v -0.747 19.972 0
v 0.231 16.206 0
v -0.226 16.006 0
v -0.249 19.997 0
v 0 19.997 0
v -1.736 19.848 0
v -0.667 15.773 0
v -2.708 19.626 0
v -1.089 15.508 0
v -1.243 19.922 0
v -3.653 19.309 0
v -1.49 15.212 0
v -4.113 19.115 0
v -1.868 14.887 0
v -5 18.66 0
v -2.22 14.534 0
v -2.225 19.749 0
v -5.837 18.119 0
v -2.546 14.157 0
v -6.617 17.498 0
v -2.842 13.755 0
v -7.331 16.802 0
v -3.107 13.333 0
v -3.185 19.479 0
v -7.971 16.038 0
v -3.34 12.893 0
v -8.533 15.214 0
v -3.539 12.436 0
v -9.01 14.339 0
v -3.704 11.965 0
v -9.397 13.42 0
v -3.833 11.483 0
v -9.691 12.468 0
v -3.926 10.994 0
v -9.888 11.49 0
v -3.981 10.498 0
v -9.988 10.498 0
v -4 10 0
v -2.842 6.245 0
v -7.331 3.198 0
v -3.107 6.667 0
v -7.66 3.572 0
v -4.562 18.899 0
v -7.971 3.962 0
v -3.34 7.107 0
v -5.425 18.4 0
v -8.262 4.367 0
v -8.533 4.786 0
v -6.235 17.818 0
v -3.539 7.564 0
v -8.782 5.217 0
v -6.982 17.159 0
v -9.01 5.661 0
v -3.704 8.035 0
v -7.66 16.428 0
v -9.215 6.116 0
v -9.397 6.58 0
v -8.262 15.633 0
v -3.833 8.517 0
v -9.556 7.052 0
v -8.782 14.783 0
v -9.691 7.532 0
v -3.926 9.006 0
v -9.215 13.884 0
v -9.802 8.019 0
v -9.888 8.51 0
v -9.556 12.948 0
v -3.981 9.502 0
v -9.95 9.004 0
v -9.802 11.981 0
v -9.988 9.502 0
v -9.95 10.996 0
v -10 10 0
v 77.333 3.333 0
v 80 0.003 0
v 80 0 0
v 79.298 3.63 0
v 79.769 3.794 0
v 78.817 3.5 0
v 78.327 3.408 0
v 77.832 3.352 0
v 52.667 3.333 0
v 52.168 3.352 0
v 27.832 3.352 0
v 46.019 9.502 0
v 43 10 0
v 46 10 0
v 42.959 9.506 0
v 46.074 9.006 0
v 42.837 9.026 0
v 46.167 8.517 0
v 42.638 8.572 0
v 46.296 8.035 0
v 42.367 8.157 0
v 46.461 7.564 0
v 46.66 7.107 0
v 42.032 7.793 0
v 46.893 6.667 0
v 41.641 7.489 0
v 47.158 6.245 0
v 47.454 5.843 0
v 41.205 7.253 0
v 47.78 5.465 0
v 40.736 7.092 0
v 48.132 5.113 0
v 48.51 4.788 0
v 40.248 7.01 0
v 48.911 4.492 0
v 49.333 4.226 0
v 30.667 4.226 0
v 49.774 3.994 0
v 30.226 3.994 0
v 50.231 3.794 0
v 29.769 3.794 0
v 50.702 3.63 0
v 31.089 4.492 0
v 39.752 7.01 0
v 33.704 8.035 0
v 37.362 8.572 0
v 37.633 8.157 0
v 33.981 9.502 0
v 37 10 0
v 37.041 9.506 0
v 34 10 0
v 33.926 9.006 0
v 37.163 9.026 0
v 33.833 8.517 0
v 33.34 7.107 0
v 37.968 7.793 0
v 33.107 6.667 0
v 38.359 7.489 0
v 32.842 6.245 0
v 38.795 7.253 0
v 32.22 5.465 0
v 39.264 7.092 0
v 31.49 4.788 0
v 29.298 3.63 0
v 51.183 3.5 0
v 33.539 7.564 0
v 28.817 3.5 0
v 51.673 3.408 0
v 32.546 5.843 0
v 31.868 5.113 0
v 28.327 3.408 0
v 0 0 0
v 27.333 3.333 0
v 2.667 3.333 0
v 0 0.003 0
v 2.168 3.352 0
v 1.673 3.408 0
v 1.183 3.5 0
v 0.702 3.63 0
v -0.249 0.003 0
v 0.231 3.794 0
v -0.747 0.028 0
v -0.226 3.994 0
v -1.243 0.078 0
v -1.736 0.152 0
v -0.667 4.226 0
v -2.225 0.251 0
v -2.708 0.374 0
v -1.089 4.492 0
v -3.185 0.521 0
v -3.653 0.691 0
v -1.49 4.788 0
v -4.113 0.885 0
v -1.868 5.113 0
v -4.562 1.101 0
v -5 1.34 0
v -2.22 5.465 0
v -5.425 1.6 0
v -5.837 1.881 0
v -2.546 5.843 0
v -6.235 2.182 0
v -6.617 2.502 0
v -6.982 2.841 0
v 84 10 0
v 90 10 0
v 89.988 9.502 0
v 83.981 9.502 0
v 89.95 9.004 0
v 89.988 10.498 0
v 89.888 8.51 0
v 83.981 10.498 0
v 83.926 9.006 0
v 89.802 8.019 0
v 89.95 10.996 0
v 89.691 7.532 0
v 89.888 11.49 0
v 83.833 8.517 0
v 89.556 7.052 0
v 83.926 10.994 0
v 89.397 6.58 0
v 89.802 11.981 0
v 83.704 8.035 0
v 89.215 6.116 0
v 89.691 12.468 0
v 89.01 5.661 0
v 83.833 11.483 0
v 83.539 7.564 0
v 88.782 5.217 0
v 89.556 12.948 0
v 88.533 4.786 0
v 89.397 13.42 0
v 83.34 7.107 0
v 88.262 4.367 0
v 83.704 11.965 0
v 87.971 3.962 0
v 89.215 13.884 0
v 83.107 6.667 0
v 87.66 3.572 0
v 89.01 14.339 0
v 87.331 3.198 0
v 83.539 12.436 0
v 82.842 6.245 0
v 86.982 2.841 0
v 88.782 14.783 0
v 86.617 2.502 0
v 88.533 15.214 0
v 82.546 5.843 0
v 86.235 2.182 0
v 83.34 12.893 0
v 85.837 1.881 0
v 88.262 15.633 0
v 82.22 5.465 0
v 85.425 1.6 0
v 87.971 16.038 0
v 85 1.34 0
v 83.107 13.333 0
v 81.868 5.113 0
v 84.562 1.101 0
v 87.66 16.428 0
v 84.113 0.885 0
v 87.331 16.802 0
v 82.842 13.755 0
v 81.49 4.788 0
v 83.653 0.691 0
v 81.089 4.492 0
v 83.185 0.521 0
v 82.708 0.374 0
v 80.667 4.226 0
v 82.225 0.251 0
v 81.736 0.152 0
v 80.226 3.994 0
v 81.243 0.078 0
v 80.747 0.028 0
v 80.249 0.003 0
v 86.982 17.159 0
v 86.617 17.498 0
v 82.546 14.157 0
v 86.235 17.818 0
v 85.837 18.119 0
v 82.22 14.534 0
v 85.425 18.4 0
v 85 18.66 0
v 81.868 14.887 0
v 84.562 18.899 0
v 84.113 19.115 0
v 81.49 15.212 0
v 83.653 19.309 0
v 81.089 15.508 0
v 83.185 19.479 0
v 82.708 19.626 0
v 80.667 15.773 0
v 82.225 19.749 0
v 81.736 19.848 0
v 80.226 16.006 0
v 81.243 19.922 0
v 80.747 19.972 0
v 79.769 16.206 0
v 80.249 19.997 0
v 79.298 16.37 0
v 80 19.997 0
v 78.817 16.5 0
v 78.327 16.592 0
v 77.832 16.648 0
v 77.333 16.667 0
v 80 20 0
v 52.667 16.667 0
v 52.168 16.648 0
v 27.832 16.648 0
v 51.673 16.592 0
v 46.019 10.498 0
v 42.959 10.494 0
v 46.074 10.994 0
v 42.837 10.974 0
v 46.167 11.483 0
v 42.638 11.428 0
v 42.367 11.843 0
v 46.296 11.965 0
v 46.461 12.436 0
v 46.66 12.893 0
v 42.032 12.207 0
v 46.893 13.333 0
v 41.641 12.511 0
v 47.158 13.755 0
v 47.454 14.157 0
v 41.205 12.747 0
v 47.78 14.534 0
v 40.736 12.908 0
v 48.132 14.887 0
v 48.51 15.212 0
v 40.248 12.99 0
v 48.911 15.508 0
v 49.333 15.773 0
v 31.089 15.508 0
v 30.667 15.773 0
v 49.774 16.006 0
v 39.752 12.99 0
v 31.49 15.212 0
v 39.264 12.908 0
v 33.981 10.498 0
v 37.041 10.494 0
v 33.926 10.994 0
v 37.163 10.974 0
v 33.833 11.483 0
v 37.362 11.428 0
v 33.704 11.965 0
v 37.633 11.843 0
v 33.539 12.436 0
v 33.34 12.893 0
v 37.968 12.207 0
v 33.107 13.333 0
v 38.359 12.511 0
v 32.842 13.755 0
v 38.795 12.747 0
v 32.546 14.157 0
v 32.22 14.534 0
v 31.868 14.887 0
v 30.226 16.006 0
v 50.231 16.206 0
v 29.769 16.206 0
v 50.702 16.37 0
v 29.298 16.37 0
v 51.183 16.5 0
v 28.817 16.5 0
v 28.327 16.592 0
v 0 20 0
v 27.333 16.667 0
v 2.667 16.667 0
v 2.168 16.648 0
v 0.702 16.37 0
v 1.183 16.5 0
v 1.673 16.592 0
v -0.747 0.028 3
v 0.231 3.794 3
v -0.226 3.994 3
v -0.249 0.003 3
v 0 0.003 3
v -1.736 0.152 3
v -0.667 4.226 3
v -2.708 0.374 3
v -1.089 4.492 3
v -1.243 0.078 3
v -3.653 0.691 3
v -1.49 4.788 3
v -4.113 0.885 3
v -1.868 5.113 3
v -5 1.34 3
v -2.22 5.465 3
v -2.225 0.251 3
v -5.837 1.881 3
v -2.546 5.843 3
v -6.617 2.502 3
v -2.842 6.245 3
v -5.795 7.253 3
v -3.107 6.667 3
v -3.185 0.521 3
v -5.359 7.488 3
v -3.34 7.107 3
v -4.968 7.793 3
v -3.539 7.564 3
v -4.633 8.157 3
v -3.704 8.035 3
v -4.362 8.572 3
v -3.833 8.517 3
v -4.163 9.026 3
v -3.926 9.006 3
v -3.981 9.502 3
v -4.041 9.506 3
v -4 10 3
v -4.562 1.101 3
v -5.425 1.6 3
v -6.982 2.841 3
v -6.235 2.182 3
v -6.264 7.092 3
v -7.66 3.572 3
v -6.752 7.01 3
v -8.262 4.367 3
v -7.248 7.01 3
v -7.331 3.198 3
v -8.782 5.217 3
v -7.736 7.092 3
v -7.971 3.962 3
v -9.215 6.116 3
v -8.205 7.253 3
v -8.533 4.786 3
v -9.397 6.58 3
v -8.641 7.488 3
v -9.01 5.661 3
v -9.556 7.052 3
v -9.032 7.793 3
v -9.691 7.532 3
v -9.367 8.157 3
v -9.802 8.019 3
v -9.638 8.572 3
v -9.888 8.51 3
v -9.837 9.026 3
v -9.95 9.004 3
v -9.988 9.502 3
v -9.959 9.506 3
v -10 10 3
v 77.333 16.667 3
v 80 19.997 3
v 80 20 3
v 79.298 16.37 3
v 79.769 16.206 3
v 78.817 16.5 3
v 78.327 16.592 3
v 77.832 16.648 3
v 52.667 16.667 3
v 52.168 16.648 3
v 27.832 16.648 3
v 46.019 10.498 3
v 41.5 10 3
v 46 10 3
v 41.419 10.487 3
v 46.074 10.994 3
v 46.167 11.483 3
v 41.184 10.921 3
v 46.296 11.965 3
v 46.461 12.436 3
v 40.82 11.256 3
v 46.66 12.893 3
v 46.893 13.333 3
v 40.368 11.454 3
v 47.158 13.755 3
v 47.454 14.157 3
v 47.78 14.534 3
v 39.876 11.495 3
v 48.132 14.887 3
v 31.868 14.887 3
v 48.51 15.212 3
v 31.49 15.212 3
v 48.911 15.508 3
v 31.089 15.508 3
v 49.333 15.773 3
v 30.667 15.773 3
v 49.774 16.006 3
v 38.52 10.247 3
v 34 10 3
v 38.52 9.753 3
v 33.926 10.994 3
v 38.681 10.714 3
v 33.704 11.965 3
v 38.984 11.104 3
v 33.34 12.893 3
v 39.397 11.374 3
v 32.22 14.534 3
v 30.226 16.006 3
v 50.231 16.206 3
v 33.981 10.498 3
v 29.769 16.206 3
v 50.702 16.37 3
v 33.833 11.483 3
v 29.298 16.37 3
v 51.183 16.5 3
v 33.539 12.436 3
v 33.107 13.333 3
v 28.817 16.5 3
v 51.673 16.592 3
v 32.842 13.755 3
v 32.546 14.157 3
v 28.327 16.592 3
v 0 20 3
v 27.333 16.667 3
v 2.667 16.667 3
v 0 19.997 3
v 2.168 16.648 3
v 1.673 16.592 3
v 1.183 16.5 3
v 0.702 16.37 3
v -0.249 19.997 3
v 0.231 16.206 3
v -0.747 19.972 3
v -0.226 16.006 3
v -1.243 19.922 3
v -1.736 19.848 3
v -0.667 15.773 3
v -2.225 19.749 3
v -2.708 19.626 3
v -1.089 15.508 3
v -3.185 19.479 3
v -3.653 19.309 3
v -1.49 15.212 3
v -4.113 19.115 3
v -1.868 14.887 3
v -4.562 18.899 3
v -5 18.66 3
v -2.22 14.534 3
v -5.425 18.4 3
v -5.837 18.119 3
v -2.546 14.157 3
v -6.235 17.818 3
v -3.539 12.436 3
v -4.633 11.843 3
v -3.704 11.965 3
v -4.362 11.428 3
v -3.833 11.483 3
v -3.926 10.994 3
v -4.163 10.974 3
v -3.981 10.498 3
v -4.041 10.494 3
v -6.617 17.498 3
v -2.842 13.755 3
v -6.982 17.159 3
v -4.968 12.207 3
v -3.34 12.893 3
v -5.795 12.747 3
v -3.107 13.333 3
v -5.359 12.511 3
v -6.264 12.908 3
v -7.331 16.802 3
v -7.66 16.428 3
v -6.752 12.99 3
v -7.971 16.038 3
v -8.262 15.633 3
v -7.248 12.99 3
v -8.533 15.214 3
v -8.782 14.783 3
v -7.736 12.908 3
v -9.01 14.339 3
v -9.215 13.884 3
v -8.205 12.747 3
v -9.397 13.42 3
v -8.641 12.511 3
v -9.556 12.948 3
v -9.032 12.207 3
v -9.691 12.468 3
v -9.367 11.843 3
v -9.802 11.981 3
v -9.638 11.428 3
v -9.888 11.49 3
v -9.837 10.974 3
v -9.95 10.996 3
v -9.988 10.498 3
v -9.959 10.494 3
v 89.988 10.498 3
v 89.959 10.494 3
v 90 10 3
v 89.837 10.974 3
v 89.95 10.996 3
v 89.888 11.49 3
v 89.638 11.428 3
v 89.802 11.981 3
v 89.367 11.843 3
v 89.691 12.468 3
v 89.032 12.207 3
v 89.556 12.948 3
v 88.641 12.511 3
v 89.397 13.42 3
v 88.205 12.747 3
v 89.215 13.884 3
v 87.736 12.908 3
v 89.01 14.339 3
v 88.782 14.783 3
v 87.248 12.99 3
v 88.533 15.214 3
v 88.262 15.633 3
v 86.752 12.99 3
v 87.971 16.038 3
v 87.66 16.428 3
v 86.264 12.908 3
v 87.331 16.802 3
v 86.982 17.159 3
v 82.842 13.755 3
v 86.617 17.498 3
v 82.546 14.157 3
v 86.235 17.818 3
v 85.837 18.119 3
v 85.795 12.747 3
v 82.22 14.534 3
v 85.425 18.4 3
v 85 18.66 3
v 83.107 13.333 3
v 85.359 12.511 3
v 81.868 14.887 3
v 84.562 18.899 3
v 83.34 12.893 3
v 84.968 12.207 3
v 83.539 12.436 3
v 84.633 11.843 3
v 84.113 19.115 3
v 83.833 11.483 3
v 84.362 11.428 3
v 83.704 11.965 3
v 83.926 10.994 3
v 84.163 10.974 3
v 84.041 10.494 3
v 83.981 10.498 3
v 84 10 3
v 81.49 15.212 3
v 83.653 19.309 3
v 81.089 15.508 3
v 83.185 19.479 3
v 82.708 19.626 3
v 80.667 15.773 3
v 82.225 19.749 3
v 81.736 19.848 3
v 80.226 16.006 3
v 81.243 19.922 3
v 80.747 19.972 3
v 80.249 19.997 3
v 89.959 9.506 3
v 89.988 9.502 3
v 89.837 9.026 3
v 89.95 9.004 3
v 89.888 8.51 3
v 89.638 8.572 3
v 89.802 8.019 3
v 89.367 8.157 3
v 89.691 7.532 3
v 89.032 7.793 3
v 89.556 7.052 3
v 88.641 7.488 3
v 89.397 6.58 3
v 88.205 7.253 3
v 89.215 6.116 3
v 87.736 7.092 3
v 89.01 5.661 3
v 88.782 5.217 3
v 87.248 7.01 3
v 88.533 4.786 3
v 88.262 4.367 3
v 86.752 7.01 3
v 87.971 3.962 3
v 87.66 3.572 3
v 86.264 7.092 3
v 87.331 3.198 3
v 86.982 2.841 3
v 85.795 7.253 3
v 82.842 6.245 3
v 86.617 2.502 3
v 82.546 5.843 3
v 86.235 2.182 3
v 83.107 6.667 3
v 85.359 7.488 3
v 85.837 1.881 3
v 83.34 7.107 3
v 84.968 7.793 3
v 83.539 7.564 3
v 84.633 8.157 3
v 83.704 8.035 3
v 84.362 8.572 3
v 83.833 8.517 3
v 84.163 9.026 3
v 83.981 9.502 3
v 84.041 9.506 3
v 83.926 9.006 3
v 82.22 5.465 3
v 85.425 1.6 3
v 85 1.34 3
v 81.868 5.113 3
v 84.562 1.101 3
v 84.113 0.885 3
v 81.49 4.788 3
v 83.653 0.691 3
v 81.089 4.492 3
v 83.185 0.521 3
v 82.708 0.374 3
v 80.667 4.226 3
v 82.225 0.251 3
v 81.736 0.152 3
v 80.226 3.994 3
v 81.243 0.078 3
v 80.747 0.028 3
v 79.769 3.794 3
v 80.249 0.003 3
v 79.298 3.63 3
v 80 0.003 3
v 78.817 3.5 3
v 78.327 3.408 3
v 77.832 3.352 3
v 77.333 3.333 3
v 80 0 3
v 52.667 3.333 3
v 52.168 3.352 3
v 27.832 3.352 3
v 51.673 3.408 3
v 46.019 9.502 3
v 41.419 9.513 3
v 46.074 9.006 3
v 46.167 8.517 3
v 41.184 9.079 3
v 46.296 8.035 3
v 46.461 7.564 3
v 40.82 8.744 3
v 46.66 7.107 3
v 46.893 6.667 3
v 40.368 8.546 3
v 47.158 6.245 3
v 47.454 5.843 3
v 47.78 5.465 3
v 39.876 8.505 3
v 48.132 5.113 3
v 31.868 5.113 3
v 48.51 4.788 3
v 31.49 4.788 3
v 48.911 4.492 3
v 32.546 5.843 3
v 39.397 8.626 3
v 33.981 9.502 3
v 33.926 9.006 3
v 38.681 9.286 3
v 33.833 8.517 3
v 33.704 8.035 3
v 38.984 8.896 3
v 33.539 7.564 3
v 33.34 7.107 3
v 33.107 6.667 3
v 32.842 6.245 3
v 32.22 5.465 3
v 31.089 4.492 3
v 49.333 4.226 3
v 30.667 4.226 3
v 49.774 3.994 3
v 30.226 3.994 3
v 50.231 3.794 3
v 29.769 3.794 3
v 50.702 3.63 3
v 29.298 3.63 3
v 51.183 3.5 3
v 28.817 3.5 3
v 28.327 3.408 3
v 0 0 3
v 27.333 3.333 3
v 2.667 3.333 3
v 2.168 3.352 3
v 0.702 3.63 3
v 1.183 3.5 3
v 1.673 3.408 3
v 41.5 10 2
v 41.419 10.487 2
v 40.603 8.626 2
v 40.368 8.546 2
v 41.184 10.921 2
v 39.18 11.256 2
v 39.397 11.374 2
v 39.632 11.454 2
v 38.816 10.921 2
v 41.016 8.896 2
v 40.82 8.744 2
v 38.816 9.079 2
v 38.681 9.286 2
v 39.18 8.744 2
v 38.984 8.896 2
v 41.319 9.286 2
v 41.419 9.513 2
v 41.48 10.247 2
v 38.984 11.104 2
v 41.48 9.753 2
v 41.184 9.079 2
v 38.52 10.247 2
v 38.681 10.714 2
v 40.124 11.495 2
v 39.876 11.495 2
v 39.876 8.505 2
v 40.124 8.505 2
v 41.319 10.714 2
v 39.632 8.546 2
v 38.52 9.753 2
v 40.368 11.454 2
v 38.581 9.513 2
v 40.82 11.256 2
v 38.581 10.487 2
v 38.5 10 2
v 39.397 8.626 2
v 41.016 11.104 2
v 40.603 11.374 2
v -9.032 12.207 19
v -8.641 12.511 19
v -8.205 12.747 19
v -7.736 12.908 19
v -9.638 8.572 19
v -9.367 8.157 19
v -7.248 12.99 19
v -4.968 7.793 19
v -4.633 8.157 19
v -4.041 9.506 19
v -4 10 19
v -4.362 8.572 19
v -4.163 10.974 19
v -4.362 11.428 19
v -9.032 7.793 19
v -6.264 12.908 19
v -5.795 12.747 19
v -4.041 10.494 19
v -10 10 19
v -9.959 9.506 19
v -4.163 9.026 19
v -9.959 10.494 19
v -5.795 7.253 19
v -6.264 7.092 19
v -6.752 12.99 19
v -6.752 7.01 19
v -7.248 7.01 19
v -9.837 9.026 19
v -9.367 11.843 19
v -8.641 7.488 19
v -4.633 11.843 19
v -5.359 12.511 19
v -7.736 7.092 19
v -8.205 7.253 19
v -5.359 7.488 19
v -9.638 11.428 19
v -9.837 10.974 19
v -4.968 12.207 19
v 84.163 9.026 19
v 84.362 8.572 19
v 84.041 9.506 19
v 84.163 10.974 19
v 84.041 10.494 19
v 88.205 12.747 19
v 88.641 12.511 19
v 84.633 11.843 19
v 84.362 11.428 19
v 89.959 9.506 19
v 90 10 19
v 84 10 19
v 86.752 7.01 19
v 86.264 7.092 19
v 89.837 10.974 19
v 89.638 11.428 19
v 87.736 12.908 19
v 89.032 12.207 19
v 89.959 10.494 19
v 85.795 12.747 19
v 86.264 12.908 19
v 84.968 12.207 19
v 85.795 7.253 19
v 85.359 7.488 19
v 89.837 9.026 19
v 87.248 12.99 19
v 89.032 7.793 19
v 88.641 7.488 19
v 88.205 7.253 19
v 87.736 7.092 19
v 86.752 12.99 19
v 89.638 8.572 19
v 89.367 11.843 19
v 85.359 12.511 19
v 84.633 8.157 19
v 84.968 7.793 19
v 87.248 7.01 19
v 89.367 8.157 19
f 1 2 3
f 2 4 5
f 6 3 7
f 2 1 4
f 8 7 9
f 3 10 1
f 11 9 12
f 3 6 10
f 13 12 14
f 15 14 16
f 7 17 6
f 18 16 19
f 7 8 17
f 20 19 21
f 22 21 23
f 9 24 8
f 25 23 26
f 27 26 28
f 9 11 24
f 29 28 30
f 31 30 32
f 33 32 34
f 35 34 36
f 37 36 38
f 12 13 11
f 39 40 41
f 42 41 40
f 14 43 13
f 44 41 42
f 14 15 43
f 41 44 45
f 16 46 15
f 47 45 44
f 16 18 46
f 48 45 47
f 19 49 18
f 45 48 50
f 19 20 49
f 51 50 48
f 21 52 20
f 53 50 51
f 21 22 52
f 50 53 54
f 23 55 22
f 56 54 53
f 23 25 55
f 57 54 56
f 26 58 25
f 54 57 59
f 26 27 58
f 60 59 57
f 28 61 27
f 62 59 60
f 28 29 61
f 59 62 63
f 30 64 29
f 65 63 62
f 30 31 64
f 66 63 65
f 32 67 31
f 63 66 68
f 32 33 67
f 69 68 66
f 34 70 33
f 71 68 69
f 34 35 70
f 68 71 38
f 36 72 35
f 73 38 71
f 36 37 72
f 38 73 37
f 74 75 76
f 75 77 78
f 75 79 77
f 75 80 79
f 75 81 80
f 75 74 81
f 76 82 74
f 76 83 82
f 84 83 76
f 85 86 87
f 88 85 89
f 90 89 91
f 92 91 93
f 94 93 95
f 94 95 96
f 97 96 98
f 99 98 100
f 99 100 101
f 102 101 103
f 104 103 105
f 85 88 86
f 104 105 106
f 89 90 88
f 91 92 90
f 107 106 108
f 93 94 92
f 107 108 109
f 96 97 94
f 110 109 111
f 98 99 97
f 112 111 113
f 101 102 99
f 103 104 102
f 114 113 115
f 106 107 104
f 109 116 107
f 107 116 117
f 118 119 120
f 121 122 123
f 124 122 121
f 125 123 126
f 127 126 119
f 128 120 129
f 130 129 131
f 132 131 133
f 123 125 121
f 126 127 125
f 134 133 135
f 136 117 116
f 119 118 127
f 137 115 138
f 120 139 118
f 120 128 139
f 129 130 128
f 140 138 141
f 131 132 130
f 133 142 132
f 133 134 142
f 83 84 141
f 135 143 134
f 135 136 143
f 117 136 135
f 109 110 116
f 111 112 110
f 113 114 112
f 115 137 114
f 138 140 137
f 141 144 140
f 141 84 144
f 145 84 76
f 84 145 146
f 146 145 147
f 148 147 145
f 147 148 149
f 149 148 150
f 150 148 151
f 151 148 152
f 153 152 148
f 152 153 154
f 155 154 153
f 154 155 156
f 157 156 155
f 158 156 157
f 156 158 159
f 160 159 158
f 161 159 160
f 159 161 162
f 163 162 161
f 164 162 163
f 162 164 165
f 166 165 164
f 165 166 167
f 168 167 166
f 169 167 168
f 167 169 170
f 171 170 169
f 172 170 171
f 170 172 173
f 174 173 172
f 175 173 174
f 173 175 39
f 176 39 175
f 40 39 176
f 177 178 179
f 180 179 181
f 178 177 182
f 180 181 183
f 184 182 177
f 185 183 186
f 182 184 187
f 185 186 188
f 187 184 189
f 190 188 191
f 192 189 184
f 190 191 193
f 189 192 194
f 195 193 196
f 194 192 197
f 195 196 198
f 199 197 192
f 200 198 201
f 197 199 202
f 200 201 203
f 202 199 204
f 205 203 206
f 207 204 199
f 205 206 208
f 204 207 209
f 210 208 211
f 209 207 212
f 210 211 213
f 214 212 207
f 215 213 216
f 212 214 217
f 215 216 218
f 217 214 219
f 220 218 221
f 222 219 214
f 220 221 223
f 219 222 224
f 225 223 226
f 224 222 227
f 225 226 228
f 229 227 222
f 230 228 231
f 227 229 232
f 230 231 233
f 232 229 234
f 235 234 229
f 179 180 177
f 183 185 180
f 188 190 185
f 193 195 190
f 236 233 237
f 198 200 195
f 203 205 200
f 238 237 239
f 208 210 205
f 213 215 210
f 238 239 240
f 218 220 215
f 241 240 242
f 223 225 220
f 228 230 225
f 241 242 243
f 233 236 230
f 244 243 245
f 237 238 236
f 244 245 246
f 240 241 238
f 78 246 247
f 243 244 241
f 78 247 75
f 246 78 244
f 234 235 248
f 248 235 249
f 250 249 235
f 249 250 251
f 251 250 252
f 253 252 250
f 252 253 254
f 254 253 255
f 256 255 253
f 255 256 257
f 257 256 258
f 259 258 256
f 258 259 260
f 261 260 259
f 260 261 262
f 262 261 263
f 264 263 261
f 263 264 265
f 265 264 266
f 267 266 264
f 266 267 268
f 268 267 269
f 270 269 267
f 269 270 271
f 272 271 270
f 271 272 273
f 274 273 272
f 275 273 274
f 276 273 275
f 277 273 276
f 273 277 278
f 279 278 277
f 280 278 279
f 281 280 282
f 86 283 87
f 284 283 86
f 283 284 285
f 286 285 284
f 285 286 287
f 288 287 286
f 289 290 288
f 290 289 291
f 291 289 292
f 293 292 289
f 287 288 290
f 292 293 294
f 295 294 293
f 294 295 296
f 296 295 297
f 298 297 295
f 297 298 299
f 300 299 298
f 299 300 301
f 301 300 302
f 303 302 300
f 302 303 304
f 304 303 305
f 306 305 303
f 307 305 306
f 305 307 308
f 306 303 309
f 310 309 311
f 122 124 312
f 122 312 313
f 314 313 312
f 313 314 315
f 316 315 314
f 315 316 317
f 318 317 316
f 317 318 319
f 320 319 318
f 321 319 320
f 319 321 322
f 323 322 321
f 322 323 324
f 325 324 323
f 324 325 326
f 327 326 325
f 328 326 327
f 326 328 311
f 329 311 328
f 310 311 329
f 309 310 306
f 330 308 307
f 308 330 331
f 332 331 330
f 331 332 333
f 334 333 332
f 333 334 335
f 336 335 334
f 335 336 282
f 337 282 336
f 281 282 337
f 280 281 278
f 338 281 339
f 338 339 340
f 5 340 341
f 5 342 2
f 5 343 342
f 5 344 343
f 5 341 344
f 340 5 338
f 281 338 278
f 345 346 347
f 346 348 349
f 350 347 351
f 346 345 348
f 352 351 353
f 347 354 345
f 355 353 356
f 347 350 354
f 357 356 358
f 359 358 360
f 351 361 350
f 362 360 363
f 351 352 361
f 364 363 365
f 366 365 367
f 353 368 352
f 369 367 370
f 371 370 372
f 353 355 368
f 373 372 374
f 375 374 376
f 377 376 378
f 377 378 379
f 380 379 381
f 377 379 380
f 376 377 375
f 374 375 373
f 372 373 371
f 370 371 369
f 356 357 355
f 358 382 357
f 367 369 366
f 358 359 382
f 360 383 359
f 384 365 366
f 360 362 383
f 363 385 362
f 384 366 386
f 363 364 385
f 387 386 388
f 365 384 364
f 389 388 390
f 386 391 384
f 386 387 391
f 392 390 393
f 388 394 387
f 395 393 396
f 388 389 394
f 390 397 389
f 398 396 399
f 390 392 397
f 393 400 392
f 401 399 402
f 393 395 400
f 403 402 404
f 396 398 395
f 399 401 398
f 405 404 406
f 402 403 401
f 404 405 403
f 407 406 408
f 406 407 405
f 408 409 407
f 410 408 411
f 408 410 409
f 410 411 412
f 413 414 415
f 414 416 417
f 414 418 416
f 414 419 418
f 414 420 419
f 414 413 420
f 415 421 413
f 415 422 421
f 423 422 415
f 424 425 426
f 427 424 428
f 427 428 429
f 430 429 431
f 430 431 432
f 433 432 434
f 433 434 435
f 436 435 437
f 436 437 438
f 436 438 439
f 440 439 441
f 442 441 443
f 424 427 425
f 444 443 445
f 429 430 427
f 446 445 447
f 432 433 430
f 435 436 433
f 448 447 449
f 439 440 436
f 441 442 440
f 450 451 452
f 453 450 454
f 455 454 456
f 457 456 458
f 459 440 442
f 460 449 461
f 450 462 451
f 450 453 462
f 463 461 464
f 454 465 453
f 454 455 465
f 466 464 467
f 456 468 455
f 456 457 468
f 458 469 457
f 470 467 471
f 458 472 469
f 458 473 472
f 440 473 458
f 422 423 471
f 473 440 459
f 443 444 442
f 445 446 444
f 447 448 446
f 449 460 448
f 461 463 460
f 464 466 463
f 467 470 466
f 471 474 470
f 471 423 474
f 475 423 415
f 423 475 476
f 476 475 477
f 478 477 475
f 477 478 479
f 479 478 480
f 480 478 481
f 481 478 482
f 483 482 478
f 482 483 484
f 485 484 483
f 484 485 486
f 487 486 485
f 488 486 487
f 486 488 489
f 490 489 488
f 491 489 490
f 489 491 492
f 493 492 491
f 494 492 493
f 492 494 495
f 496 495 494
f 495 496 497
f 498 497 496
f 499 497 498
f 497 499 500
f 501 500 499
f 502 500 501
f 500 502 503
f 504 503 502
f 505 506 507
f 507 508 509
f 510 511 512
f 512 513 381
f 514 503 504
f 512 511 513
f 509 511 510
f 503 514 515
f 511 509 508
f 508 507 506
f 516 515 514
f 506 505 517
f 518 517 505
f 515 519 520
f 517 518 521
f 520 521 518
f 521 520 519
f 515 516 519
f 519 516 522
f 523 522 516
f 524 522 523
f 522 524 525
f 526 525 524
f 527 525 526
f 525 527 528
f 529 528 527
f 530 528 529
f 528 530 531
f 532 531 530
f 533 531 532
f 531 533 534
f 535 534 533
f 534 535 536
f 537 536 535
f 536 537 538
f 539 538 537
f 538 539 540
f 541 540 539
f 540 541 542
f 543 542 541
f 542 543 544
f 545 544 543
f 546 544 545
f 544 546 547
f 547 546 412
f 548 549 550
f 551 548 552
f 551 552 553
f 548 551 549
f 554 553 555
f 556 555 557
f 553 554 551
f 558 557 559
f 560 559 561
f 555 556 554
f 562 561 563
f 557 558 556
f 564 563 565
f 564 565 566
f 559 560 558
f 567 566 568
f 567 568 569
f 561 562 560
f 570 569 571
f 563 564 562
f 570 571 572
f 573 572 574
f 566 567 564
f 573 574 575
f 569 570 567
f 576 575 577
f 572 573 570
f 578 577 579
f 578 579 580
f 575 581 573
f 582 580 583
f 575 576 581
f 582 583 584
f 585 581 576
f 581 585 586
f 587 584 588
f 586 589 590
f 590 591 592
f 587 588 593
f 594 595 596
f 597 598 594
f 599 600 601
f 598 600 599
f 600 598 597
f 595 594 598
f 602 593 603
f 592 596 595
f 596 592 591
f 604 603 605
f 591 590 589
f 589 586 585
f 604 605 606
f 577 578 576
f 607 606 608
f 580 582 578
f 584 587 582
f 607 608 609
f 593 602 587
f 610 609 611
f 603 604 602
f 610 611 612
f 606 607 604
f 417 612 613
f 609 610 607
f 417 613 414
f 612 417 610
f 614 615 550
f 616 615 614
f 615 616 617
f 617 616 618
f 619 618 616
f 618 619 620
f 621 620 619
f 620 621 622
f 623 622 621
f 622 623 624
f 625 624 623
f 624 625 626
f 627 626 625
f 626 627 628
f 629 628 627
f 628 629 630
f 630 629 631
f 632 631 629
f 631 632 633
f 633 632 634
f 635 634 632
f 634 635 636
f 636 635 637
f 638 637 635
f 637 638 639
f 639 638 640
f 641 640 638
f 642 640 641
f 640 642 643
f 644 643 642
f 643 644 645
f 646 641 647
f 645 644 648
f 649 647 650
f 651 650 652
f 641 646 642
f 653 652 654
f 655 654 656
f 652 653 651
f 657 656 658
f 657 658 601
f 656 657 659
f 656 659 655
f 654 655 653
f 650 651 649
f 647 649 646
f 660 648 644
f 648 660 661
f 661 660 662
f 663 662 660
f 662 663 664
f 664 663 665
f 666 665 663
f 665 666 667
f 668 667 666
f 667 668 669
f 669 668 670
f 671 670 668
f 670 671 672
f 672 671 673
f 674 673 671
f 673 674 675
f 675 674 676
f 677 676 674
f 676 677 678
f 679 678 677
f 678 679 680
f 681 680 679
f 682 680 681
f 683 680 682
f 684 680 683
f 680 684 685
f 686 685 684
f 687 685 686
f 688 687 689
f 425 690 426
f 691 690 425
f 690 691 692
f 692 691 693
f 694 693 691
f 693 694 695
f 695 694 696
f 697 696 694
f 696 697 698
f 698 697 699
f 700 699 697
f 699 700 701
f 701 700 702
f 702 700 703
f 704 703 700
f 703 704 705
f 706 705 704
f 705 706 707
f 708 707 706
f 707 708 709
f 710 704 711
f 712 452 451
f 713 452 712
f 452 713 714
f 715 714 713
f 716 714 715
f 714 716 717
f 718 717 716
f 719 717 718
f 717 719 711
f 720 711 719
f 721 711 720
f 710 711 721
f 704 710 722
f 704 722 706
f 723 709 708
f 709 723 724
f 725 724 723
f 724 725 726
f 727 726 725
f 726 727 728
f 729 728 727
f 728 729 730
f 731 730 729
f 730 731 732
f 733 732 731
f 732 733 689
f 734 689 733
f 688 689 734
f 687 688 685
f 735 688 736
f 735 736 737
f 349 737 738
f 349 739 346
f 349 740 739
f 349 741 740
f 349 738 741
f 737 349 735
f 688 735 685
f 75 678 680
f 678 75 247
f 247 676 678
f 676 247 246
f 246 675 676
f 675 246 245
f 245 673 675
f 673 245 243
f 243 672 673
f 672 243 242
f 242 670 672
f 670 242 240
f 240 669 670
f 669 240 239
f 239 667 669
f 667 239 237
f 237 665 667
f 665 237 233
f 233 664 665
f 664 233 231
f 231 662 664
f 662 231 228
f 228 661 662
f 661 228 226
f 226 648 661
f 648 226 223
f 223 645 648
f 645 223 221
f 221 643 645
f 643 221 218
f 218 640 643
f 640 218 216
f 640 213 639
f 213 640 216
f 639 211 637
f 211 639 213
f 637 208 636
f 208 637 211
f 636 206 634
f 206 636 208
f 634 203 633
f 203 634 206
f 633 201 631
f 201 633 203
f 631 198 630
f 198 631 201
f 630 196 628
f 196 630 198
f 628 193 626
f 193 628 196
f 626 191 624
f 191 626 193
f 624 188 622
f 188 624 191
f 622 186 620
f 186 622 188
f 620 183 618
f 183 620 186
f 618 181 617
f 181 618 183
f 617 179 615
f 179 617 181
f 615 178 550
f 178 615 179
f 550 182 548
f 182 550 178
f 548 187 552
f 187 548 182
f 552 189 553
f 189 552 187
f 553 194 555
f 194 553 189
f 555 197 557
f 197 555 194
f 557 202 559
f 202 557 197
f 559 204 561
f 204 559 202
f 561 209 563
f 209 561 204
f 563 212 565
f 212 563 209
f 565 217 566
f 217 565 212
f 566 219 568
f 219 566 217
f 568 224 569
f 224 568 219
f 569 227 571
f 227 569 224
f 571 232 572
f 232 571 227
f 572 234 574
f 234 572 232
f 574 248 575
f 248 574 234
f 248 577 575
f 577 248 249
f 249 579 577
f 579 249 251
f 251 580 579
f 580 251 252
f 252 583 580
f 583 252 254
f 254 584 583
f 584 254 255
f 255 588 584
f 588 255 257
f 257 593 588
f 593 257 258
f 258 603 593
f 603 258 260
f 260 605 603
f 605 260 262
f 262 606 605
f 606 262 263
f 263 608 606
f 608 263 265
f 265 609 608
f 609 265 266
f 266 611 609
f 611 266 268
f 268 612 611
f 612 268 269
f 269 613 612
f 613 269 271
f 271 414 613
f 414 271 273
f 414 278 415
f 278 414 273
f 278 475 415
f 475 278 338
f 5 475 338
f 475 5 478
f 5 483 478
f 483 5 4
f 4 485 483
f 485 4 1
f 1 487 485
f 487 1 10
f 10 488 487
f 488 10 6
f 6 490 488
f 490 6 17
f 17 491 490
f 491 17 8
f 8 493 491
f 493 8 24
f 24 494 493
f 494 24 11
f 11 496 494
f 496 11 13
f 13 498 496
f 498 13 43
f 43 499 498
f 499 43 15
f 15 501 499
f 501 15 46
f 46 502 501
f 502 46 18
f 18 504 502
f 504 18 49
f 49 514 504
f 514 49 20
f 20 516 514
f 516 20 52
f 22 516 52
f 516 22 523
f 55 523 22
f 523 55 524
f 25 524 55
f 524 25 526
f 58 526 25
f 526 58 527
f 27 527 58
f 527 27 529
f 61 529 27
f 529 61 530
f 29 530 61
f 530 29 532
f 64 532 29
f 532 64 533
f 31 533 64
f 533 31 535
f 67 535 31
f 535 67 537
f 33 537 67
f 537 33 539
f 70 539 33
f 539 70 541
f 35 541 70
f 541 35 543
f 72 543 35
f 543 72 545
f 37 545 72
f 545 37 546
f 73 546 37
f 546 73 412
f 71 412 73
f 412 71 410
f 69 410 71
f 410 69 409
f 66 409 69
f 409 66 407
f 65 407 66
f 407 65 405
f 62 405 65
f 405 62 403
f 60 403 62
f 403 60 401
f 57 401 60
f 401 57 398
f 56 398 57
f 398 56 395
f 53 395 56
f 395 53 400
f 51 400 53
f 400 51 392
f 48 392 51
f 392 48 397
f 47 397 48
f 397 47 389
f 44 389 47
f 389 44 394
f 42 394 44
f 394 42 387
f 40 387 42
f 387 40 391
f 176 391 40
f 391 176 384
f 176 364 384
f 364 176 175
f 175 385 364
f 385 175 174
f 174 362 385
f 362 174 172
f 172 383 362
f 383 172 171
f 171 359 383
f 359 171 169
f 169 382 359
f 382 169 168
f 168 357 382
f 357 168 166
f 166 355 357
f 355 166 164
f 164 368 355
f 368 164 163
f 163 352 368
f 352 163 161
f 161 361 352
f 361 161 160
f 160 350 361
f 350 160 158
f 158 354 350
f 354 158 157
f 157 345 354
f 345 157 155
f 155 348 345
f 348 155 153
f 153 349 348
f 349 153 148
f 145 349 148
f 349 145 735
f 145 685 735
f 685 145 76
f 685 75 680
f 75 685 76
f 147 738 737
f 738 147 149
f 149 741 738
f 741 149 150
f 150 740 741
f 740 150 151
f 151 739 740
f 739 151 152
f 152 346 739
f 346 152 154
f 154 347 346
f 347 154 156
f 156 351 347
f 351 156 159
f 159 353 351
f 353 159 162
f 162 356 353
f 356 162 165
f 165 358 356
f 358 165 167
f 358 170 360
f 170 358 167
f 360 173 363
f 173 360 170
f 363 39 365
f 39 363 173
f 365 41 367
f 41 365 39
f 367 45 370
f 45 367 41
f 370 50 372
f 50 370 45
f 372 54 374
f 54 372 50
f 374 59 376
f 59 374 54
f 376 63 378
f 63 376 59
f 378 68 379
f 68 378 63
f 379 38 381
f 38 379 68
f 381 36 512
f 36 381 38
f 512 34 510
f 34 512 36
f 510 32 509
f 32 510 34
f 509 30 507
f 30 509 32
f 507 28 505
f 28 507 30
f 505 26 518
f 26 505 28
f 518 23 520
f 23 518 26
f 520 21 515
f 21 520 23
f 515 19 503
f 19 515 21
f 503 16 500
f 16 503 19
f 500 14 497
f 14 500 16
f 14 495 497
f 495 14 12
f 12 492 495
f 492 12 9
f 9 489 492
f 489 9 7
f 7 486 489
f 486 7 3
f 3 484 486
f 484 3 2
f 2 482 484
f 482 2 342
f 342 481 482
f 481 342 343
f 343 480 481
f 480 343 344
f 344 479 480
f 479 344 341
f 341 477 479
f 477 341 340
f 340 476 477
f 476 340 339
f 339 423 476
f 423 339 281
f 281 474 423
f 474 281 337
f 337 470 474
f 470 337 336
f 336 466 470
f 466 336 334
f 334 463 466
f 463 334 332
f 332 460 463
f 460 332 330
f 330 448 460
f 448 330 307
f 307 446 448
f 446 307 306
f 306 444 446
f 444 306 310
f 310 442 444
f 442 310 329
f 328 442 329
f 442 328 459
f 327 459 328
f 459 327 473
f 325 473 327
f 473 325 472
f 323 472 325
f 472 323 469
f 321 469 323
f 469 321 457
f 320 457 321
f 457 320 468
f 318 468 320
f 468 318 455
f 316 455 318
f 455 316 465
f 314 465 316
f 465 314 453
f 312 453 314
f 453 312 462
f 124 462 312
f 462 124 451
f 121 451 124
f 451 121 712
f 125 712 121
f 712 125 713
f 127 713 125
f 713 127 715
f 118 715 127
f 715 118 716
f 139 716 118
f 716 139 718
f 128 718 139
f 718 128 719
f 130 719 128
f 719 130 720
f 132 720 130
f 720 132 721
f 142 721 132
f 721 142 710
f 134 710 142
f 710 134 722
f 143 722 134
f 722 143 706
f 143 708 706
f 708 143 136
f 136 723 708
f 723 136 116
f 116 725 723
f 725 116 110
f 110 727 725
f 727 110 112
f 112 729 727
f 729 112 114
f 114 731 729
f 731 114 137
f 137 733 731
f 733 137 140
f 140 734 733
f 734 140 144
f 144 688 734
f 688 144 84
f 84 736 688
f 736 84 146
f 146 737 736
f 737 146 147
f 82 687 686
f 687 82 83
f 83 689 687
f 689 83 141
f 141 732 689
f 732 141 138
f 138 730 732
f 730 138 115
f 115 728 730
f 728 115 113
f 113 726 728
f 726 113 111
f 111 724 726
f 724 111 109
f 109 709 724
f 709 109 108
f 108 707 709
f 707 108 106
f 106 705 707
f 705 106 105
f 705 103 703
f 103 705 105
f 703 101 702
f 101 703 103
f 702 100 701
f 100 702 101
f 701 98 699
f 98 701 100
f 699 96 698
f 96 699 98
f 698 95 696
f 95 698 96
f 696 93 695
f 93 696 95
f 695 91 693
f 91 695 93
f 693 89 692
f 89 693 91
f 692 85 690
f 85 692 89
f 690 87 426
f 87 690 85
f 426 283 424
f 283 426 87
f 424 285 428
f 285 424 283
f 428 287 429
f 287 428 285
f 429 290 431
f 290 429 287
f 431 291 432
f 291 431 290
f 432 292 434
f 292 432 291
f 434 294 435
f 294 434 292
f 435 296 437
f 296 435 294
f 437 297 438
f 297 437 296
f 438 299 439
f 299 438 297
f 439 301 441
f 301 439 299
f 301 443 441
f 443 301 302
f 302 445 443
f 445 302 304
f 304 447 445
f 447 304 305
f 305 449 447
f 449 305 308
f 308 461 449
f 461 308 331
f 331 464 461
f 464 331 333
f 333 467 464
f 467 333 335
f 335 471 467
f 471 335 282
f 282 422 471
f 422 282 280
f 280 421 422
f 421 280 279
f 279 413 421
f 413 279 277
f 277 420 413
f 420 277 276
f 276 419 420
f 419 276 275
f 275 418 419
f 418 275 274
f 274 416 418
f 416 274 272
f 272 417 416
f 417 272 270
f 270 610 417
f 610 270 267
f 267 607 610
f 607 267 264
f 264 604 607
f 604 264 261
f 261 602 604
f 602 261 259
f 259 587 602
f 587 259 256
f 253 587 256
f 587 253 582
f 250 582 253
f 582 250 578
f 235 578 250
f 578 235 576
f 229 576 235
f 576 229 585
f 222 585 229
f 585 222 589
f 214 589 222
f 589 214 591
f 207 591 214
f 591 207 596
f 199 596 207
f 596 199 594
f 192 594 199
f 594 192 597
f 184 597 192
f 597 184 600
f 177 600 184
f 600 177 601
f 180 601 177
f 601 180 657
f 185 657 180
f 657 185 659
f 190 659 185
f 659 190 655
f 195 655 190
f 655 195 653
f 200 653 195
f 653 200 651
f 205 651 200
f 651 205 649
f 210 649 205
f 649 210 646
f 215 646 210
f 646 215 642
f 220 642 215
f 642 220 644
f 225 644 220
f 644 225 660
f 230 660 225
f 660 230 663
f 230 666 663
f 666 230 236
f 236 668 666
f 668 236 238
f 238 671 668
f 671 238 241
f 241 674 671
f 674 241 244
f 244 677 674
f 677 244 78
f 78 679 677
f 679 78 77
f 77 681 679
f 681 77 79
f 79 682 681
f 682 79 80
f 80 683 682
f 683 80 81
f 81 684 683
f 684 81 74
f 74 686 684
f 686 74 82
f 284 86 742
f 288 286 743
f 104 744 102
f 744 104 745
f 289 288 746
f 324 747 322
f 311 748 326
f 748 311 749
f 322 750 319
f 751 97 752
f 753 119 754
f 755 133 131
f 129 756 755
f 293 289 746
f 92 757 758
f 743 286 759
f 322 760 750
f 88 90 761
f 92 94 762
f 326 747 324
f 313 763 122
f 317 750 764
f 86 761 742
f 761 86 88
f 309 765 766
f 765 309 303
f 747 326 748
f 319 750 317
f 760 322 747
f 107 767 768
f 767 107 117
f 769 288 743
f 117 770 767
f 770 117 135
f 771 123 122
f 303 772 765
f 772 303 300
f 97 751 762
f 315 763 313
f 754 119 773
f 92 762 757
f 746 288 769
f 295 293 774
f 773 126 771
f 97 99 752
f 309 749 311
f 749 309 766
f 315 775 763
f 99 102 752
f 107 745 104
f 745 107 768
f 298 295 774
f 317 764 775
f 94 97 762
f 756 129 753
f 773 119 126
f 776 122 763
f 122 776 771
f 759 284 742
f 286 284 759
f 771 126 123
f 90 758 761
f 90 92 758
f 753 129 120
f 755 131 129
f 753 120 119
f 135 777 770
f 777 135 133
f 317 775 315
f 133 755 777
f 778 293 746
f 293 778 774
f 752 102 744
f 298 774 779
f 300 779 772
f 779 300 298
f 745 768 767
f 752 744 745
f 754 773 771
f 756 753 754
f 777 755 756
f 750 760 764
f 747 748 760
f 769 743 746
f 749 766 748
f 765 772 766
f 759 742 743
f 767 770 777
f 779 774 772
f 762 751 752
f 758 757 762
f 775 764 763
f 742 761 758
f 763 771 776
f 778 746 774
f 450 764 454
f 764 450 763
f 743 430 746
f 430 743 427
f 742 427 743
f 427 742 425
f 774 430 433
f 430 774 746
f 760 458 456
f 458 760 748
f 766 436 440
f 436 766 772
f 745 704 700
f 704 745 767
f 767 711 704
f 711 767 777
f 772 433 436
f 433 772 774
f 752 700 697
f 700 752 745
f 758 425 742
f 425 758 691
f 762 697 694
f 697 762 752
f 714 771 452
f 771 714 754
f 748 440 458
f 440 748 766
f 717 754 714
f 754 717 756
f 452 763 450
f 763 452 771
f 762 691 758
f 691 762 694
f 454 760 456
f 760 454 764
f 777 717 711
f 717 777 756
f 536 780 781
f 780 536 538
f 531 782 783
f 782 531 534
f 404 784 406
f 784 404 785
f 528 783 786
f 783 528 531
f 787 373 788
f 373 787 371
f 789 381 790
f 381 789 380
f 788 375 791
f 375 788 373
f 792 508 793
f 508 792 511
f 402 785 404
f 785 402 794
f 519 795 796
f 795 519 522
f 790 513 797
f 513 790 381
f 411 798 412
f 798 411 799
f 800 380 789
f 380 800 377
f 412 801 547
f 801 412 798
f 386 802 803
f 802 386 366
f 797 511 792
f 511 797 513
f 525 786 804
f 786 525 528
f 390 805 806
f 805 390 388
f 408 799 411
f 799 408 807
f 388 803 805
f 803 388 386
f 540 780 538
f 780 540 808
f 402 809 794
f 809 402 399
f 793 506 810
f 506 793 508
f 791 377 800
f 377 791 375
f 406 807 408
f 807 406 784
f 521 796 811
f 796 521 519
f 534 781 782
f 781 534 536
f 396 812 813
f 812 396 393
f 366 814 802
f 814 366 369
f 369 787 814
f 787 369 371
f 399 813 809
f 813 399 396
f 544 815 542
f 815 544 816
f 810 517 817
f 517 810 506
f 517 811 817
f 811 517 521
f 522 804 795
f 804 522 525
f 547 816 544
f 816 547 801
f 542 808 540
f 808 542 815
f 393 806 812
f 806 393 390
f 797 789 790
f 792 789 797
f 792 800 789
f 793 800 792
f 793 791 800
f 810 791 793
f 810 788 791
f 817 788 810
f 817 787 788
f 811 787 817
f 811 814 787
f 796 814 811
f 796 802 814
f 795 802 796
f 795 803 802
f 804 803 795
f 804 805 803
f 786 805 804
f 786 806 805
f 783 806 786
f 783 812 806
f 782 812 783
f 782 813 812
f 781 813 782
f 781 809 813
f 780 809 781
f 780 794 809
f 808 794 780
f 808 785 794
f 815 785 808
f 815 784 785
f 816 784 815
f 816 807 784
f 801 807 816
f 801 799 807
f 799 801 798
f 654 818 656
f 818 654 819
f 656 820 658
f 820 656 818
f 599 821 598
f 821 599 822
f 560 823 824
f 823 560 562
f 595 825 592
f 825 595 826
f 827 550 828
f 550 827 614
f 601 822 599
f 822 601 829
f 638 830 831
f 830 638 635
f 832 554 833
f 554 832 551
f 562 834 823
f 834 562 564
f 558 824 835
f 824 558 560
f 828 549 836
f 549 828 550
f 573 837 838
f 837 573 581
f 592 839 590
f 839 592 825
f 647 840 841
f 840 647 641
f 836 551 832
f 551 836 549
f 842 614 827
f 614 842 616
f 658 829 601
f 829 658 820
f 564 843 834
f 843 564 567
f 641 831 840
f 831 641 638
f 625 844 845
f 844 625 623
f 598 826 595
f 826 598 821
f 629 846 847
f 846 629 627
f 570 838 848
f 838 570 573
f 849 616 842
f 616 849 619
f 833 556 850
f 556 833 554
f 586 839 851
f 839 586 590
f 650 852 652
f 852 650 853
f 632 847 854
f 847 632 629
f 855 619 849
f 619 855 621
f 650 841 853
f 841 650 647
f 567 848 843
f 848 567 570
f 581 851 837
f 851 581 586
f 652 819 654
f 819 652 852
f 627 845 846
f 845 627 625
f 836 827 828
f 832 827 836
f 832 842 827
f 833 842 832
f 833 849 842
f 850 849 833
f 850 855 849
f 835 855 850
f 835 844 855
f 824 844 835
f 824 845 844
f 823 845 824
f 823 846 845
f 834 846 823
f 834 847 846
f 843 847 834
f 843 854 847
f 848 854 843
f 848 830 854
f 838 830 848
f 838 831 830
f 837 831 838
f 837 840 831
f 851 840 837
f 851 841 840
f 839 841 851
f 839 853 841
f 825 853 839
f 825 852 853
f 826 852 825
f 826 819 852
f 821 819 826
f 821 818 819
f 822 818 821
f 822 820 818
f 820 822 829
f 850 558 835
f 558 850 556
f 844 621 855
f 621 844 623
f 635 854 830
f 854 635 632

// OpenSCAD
/******************************************************************************
 *
 *  GLOBALS
 *
 ******************************************************************************/

/* [General] */

// Overall length
length = 100;
limiterDiameter = 6;
// Measured without plate thickness
limiterHeight = 16;
holeDiameter = 3;
plateWidth = 20;
plateThickness = 3;

/* [Hidden] */
$fa = 1;
$fs = 0.5;


/******************************************************************************
 *
 *  EXECUTION
 *
 ******************************************************************************/


plate();
limiters();


/***************************************************************************
 *
 *  DIRECT MODULES
 *
 ******************************************************************************/


module plate()
{
    difference()
    {
        linear_extrude(height = plateThickness, convexity = 8)
            _platePlane();
        translate([(length - plateWidth) / 2, plateWidth / 2, -0.0002])
            cylinder(plateThickness - 1, holeDiameter / 2 + plateThickness / 2, holeDiameter / 2 );
        translate([(length - plateWidth) / 2, plateWidth / 2, 0])
            cylinder(plateThickness + 1, holeDiameter / 2, holeDiameter / 2);
    }

}

module limiters()
{
    translate([-(plateWidth / 2 - limiterDiameter / 2), plateWidth / 2, plateThickness])
        cylinder(r = limiterDiameter / 2, h = limiterHeight);
    translate([length - plateWidth/2 - limiterDiameter / 2, plateWidth / 2, plateThickness])
        cylinder(r = limiterDiameter / 2, h = limiterHeight);
}



/******************************************************************************
 *
 *  HELPER AND COMPONENT MODULES
 *
 ******************************************************************************/

module _platePlane()
{
    difference()
    {
        union()
        {
            translate([0, plateWidth / 2, 0])
                circle(plateWidth / 2);
            square([length - plateWidth, plateWidth]);
            translate([length - plateWidth, plateWidth / 2, 0])
                circle(plateWidth / 2);
        }
        hull()
        {
            translate([-plateWidth / 2 + limiterDiameter + plateWidth / 3, plateWidth / 2, 0])
                circle(plateWidth / 3);
            translate([length / 2 - plateWidth / 2 - plateWidth / 3 - holeDiameter - plateThickness, plateWidth / 2, 0])
                circle(plateWidth / 3);
        }
        hull()
        {
            translate([length / 2 - plateWidth / 2 + plateWidth / 3 + holeDiameter + plateThickness, plateWidth / 2, 0])
                circle(plateWidth / 3);
            translate([length - limiterDiameter - plateWidth / 3 - plateWidth / 2, plateWidth / 2, 0])
                circle(plateWidth / 3);
        }
    }
}
